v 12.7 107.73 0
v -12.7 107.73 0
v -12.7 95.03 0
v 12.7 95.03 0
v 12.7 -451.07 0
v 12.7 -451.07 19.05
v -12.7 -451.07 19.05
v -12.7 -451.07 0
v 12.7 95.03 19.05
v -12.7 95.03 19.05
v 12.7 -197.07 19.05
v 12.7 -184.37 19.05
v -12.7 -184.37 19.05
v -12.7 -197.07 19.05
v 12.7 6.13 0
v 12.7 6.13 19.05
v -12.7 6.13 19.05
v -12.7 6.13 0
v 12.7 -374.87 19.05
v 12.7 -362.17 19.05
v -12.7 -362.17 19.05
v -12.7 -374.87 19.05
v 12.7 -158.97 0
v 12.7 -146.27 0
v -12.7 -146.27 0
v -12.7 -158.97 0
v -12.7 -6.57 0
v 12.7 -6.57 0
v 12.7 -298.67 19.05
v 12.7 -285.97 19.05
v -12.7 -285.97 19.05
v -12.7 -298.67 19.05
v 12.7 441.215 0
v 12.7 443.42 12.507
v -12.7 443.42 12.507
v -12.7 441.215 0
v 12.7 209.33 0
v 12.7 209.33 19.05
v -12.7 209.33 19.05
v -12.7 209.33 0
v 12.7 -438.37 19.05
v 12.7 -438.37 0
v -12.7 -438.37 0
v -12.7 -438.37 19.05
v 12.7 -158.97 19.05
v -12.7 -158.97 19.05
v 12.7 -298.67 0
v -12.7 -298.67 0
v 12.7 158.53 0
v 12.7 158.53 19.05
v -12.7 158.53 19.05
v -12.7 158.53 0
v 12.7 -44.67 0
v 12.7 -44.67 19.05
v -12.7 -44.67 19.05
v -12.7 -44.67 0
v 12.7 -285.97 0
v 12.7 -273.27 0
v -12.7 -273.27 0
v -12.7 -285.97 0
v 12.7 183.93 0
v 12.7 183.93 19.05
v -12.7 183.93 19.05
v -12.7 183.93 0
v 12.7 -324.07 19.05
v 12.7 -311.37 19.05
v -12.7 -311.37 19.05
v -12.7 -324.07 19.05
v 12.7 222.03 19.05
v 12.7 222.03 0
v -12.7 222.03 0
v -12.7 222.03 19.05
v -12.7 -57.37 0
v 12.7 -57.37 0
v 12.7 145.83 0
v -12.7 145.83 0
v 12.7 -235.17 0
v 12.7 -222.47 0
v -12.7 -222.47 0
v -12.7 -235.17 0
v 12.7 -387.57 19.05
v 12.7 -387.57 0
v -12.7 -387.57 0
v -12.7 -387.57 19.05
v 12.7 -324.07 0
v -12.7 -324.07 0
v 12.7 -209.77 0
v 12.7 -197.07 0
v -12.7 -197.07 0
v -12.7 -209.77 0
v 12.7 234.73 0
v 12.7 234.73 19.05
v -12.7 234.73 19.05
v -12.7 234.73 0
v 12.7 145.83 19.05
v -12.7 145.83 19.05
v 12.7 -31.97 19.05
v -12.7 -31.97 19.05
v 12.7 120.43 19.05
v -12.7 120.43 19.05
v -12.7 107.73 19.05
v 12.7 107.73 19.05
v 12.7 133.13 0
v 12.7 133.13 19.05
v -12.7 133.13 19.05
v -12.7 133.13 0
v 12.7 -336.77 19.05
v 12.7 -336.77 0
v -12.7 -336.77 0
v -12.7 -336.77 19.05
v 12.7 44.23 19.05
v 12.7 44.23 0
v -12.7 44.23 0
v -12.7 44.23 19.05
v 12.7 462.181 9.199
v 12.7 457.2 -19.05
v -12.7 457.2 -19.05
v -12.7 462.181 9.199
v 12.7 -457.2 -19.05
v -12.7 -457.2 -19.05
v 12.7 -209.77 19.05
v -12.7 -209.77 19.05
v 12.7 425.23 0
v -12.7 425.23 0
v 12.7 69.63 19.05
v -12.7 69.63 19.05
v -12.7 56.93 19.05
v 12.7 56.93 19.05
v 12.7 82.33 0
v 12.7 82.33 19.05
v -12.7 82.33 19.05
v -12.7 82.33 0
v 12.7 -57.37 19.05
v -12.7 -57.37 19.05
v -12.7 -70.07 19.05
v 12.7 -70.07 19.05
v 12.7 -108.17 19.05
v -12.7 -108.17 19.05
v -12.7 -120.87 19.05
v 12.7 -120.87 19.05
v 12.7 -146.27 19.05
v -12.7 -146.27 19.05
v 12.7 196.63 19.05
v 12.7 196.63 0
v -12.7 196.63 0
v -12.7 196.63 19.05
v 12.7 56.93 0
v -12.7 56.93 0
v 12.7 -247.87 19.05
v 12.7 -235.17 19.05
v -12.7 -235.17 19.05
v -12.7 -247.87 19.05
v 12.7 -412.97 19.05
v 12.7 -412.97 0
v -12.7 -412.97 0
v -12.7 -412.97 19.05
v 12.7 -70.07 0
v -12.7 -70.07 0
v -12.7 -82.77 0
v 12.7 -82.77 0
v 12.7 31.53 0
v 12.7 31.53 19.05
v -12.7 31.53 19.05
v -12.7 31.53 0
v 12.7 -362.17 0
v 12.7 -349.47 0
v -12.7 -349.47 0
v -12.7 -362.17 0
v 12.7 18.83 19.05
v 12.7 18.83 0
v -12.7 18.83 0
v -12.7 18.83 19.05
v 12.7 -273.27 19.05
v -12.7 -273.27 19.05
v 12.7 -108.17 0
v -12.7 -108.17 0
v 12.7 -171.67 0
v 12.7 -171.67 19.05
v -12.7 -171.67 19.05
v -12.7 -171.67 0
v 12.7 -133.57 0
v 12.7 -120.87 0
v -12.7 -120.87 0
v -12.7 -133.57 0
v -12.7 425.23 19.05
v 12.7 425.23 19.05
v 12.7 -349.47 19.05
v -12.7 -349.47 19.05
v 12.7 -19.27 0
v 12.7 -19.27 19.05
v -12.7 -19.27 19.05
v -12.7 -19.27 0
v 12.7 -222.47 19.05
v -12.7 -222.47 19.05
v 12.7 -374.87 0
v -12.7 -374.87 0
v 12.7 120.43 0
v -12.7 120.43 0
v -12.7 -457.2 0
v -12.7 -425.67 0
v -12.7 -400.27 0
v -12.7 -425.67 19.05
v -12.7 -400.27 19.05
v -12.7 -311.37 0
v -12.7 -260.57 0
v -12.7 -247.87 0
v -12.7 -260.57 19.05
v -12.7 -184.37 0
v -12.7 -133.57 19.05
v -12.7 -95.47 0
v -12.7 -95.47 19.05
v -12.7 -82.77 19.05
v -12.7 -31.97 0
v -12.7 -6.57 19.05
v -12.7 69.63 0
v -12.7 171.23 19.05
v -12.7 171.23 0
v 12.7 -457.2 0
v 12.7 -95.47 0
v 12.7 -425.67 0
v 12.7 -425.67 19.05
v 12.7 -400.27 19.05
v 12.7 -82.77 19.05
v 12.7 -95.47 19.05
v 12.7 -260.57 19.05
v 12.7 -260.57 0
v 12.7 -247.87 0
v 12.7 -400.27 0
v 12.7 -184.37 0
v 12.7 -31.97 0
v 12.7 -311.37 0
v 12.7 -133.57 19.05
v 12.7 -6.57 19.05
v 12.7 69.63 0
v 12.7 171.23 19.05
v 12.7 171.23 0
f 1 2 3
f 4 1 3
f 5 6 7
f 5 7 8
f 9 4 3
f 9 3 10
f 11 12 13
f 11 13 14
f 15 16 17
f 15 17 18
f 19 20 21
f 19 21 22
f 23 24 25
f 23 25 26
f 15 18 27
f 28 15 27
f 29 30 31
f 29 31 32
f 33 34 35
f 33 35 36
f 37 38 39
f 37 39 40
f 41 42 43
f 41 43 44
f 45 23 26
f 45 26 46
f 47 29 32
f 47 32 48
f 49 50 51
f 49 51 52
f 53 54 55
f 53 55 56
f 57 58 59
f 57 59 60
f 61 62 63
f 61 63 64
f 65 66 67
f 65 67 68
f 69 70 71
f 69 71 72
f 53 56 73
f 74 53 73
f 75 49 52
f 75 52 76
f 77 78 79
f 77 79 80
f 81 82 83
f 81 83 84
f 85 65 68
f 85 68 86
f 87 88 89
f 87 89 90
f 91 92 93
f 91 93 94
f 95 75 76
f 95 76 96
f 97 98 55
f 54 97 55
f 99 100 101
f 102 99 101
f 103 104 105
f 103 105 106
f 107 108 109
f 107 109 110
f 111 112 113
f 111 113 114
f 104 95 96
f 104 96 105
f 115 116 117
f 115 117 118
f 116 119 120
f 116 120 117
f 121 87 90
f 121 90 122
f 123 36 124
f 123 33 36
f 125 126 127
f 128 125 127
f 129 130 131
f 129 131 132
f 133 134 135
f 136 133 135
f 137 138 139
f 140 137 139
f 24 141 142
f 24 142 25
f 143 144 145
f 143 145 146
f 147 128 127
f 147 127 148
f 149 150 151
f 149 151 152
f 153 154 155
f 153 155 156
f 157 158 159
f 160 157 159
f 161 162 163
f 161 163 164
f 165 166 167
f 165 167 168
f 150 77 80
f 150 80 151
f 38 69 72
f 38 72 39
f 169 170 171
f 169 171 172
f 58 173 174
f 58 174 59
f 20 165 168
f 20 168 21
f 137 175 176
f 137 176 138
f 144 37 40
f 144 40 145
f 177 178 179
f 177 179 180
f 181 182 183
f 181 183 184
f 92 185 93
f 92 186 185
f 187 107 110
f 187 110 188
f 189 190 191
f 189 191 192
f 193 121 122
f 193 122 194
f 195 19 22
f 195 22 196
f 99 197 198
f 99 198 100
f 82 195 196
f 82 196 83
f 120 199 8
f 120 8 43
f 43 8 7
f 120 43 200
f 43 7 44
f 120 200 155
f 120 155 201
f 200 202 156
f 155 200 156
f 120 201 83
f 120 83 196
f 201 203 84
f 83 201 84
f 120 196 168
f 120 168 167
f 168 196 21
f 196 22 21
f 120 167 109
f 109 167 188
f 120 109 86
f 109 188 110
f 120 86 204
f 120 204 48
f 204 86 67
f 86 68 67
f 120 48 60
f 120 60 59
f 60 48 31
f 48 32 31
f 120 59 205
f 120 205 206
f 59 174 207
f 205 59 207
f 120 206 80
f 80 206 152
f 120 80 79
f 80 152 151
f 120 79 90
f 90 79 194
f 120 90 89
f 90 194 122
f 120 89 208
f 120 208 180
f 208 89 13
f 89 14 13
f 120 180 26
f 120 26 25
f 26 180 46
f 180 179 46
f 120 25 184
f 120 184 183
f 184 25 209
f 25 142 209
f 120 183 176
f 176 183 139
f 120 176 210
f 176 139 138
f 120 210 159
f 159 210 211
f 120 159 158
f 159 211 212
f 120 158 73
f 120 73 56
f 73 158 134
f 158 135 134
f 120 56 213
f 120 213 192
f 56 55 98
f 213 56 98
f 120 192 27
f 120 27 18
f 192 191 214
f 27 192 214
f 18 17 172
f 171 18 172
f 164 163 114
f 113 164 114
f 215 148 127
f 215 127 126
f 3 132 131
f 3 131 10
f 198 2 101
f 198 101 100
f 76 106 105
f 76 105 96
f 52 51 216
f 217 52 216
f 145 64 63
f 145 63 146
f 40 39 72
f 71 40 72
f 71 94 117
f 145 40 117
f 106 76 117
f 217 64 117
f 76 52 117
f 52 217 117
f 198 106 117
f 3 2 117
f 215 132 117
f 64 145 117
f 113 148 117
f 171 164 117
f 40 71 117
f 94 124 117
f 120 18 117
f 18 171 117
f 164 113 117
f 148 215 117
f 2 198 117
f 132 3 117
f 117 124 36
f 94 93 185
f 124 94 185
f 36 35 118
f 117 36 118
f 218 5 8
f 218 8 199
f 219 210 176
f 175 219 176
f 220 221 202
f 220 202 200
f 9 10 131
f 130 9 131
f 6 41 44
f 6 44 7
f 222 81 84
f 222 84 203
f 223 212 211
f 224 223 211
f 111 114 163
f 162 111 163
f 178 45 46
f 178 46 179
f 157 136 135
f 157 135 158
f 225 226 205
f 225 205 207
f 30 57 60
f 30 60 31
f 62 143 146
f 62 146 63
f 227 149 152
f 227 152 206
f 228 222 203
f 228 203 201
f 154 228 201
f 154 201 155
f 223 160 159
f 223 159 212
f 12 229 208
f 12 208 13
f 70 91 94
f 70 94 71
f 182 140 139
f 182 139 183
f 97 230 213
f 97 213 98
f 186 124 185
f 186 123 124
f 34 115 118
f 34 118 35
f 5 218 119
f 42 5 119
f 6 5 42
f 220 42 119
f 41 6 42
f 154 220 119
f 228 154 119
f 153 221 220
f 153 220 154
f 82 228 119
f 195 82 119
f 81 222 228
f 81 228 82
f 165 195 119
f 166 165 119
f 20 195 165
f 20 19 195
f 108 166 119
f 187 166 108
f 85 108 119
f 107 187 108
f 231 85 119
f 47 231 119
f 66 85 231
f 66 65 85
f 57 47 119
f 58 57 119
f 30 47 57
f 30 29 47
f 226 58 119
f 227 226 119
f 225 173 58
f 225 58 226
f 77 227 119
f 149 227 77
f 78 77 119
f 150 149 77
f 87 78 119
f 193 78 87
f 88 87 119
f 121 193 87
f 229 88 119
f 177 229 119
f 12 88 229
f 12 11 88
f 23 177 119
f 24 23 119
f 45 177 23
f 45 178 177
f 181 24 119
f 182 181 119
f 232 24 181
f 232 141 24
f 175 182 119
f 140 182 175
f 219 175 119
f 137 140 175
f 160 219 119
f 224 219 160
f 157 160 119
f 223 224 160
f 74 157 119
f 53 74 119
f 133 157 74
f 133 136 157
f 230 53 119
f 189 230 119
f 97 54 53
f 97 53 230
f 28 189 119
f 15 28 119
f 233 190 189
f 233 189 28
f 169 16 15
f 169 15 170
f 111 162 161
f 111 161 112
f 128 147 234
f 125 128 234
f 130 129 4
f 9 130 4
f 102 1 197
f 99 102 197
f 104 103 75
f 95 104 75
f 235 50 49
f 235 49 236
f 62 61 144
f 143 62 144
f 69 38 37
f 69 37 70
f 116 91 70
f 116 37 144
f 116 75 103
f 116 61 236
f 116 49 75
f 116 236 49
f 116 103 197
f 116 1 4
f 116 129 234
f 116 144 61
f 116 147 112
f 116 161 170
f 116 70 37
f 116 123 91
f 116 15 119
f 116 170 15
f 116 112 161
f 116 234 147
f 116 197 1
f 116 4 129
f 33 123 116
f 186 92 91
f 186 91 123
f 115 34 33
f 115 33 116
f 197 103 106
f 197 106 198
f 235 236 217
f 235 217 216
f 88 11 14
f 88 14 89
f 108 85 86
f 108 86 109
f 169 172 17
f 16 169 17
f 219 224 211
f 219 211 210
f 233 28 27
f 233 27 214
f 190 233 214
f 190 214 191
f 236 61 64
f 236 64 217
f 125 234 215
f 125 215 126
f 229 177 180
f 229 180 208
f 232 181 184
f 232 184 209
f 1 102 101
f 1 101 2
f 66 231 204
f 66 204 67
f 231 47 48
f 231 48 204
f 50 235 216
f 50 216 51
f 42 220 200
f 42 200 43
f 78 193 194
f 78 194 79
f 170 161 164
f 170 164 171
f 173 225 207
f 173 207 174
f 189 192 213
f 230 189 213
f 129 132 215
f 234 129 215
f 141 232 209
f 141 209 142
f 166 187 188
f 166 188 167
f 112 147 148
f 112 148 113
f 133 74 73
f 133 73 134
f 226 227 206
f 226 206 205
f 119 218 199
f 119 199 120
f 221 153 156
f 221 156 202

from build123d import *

# Parameters (mm, degrees)
F1_DEPTH = 12.7


with BuildPart() as f1:
    # F0 (on Right) → F1 (new body, symmetric)
    with BuildSketch(Plane.YZ):
        Polygon((425.230304, 6.35), (425.230304, 19.05), (234.730304, 19.05), (234.730304, 0), (222.030304, 0), (222.030304, 19.05), (209.330304, 19.05), (209.330304, 0), (196.630304, 0), (196.630304, 19.05), (183.930304, 19.05), (183.930304, 0), (171.230304, 0), (171.230304, 19.05), (158.530304, 19.05), (158.530304, 0), (145.830304, 0), (145.830304, 19.05), (133.130304, 19.05), (133.130304, 0), (120.430304, 0), (120.430304, 19.05), (107.730304, 19.05), (107.730304, 0), (95.030304, 0), (95.030304, 19.05), (82.330304, 19.05), (82.330304, 0), (69.630304, 0), (69.630304, 19.05), (56.930304, 19.05), (56.930304, 0), (44.230304, 0), (44.230304, 19.05), (31.530304, 19.05), (31.530304, 0), (18.830304, 0), (18.830304, 19.05), (6.130304, 19.05), (6.130304, 0), (-6.569696, 0), (-6.569696, 19.05), (-19.269696, 19.05), (-19.269696, 0), (-31.969696, 0), (-31.969696, 19.05), (-44.669696, 19.05), (-44.669696, 0), (-57.369696, 0), (-57.369696, 19.05), (-70.069696, 19.05), (-70.069696, 0), (-82.769696, 0), (-82.769696, 19.05), (-95.469696, 19.05), (-95.469696, 0), (-108.169696, 0), (-108.169696, 19.05), (-120.869696, 19.05), (-120.869696, 0), (-133.569696, 0), (-133.569696, 19.05), (-146.269696, 19.05), (-146.269696, 0), (-158.969696, 0), (-158.969696, 19.05), (-171.669696, 19.05), (-171.669696, 0), (-184.369696, 0), (-184.369696, 19.05), (-197.069696, 19.05), (-197.069696, 0), (-209.769696, 0), (-209.769696, 19.05), (-222.469696, 19.05), (-222.469696, 0), (-235.169696, 0), (-235.169696, 19.05), (-247.869696, 19.05), (-247.869696, 0), (-260.569696, 0), (-260.569696, 19.05), (-273.269696, 19.05), (-273.269696, 0), (-285.969696, 0), (-285.969696, 19.05), (-298.669696, 19.05), (-298.669696, 0), (-311.369696, 0), (-311.369696, 19.05), (-324.069696, 19.05), (-324.069696, 0), (-336.769696, 0), (-336.769696, 19.05), (-349.469696, 19.05), (-349.469696, 0), (-362.169696, 0), (-362.169696, 19.05), (-374.869696, 19.05), (-374.869696, 0), (-387.569696, 0), (-387.569696, 19.05), (-400.269696, 19.05), (-400.269696, 0), (-412.969696, 0), (-412.969696, 19.05), (-425.669696, 19.05), (-425.669696, 0), (-438.369696, 0), (-438.369696, 19.05), (-451.069696, 19.05), (-451.069696, 0), (-457.2, 0), (-457.2, -19.05), (457.2, -19.05), (462.181072, 9.199061), (443.420484, 12.507058), (441.215152, 0), (425.230304, 0), align=None)
    extrude(amount=F1_DEPTH, both=True)


solid = f1.part
